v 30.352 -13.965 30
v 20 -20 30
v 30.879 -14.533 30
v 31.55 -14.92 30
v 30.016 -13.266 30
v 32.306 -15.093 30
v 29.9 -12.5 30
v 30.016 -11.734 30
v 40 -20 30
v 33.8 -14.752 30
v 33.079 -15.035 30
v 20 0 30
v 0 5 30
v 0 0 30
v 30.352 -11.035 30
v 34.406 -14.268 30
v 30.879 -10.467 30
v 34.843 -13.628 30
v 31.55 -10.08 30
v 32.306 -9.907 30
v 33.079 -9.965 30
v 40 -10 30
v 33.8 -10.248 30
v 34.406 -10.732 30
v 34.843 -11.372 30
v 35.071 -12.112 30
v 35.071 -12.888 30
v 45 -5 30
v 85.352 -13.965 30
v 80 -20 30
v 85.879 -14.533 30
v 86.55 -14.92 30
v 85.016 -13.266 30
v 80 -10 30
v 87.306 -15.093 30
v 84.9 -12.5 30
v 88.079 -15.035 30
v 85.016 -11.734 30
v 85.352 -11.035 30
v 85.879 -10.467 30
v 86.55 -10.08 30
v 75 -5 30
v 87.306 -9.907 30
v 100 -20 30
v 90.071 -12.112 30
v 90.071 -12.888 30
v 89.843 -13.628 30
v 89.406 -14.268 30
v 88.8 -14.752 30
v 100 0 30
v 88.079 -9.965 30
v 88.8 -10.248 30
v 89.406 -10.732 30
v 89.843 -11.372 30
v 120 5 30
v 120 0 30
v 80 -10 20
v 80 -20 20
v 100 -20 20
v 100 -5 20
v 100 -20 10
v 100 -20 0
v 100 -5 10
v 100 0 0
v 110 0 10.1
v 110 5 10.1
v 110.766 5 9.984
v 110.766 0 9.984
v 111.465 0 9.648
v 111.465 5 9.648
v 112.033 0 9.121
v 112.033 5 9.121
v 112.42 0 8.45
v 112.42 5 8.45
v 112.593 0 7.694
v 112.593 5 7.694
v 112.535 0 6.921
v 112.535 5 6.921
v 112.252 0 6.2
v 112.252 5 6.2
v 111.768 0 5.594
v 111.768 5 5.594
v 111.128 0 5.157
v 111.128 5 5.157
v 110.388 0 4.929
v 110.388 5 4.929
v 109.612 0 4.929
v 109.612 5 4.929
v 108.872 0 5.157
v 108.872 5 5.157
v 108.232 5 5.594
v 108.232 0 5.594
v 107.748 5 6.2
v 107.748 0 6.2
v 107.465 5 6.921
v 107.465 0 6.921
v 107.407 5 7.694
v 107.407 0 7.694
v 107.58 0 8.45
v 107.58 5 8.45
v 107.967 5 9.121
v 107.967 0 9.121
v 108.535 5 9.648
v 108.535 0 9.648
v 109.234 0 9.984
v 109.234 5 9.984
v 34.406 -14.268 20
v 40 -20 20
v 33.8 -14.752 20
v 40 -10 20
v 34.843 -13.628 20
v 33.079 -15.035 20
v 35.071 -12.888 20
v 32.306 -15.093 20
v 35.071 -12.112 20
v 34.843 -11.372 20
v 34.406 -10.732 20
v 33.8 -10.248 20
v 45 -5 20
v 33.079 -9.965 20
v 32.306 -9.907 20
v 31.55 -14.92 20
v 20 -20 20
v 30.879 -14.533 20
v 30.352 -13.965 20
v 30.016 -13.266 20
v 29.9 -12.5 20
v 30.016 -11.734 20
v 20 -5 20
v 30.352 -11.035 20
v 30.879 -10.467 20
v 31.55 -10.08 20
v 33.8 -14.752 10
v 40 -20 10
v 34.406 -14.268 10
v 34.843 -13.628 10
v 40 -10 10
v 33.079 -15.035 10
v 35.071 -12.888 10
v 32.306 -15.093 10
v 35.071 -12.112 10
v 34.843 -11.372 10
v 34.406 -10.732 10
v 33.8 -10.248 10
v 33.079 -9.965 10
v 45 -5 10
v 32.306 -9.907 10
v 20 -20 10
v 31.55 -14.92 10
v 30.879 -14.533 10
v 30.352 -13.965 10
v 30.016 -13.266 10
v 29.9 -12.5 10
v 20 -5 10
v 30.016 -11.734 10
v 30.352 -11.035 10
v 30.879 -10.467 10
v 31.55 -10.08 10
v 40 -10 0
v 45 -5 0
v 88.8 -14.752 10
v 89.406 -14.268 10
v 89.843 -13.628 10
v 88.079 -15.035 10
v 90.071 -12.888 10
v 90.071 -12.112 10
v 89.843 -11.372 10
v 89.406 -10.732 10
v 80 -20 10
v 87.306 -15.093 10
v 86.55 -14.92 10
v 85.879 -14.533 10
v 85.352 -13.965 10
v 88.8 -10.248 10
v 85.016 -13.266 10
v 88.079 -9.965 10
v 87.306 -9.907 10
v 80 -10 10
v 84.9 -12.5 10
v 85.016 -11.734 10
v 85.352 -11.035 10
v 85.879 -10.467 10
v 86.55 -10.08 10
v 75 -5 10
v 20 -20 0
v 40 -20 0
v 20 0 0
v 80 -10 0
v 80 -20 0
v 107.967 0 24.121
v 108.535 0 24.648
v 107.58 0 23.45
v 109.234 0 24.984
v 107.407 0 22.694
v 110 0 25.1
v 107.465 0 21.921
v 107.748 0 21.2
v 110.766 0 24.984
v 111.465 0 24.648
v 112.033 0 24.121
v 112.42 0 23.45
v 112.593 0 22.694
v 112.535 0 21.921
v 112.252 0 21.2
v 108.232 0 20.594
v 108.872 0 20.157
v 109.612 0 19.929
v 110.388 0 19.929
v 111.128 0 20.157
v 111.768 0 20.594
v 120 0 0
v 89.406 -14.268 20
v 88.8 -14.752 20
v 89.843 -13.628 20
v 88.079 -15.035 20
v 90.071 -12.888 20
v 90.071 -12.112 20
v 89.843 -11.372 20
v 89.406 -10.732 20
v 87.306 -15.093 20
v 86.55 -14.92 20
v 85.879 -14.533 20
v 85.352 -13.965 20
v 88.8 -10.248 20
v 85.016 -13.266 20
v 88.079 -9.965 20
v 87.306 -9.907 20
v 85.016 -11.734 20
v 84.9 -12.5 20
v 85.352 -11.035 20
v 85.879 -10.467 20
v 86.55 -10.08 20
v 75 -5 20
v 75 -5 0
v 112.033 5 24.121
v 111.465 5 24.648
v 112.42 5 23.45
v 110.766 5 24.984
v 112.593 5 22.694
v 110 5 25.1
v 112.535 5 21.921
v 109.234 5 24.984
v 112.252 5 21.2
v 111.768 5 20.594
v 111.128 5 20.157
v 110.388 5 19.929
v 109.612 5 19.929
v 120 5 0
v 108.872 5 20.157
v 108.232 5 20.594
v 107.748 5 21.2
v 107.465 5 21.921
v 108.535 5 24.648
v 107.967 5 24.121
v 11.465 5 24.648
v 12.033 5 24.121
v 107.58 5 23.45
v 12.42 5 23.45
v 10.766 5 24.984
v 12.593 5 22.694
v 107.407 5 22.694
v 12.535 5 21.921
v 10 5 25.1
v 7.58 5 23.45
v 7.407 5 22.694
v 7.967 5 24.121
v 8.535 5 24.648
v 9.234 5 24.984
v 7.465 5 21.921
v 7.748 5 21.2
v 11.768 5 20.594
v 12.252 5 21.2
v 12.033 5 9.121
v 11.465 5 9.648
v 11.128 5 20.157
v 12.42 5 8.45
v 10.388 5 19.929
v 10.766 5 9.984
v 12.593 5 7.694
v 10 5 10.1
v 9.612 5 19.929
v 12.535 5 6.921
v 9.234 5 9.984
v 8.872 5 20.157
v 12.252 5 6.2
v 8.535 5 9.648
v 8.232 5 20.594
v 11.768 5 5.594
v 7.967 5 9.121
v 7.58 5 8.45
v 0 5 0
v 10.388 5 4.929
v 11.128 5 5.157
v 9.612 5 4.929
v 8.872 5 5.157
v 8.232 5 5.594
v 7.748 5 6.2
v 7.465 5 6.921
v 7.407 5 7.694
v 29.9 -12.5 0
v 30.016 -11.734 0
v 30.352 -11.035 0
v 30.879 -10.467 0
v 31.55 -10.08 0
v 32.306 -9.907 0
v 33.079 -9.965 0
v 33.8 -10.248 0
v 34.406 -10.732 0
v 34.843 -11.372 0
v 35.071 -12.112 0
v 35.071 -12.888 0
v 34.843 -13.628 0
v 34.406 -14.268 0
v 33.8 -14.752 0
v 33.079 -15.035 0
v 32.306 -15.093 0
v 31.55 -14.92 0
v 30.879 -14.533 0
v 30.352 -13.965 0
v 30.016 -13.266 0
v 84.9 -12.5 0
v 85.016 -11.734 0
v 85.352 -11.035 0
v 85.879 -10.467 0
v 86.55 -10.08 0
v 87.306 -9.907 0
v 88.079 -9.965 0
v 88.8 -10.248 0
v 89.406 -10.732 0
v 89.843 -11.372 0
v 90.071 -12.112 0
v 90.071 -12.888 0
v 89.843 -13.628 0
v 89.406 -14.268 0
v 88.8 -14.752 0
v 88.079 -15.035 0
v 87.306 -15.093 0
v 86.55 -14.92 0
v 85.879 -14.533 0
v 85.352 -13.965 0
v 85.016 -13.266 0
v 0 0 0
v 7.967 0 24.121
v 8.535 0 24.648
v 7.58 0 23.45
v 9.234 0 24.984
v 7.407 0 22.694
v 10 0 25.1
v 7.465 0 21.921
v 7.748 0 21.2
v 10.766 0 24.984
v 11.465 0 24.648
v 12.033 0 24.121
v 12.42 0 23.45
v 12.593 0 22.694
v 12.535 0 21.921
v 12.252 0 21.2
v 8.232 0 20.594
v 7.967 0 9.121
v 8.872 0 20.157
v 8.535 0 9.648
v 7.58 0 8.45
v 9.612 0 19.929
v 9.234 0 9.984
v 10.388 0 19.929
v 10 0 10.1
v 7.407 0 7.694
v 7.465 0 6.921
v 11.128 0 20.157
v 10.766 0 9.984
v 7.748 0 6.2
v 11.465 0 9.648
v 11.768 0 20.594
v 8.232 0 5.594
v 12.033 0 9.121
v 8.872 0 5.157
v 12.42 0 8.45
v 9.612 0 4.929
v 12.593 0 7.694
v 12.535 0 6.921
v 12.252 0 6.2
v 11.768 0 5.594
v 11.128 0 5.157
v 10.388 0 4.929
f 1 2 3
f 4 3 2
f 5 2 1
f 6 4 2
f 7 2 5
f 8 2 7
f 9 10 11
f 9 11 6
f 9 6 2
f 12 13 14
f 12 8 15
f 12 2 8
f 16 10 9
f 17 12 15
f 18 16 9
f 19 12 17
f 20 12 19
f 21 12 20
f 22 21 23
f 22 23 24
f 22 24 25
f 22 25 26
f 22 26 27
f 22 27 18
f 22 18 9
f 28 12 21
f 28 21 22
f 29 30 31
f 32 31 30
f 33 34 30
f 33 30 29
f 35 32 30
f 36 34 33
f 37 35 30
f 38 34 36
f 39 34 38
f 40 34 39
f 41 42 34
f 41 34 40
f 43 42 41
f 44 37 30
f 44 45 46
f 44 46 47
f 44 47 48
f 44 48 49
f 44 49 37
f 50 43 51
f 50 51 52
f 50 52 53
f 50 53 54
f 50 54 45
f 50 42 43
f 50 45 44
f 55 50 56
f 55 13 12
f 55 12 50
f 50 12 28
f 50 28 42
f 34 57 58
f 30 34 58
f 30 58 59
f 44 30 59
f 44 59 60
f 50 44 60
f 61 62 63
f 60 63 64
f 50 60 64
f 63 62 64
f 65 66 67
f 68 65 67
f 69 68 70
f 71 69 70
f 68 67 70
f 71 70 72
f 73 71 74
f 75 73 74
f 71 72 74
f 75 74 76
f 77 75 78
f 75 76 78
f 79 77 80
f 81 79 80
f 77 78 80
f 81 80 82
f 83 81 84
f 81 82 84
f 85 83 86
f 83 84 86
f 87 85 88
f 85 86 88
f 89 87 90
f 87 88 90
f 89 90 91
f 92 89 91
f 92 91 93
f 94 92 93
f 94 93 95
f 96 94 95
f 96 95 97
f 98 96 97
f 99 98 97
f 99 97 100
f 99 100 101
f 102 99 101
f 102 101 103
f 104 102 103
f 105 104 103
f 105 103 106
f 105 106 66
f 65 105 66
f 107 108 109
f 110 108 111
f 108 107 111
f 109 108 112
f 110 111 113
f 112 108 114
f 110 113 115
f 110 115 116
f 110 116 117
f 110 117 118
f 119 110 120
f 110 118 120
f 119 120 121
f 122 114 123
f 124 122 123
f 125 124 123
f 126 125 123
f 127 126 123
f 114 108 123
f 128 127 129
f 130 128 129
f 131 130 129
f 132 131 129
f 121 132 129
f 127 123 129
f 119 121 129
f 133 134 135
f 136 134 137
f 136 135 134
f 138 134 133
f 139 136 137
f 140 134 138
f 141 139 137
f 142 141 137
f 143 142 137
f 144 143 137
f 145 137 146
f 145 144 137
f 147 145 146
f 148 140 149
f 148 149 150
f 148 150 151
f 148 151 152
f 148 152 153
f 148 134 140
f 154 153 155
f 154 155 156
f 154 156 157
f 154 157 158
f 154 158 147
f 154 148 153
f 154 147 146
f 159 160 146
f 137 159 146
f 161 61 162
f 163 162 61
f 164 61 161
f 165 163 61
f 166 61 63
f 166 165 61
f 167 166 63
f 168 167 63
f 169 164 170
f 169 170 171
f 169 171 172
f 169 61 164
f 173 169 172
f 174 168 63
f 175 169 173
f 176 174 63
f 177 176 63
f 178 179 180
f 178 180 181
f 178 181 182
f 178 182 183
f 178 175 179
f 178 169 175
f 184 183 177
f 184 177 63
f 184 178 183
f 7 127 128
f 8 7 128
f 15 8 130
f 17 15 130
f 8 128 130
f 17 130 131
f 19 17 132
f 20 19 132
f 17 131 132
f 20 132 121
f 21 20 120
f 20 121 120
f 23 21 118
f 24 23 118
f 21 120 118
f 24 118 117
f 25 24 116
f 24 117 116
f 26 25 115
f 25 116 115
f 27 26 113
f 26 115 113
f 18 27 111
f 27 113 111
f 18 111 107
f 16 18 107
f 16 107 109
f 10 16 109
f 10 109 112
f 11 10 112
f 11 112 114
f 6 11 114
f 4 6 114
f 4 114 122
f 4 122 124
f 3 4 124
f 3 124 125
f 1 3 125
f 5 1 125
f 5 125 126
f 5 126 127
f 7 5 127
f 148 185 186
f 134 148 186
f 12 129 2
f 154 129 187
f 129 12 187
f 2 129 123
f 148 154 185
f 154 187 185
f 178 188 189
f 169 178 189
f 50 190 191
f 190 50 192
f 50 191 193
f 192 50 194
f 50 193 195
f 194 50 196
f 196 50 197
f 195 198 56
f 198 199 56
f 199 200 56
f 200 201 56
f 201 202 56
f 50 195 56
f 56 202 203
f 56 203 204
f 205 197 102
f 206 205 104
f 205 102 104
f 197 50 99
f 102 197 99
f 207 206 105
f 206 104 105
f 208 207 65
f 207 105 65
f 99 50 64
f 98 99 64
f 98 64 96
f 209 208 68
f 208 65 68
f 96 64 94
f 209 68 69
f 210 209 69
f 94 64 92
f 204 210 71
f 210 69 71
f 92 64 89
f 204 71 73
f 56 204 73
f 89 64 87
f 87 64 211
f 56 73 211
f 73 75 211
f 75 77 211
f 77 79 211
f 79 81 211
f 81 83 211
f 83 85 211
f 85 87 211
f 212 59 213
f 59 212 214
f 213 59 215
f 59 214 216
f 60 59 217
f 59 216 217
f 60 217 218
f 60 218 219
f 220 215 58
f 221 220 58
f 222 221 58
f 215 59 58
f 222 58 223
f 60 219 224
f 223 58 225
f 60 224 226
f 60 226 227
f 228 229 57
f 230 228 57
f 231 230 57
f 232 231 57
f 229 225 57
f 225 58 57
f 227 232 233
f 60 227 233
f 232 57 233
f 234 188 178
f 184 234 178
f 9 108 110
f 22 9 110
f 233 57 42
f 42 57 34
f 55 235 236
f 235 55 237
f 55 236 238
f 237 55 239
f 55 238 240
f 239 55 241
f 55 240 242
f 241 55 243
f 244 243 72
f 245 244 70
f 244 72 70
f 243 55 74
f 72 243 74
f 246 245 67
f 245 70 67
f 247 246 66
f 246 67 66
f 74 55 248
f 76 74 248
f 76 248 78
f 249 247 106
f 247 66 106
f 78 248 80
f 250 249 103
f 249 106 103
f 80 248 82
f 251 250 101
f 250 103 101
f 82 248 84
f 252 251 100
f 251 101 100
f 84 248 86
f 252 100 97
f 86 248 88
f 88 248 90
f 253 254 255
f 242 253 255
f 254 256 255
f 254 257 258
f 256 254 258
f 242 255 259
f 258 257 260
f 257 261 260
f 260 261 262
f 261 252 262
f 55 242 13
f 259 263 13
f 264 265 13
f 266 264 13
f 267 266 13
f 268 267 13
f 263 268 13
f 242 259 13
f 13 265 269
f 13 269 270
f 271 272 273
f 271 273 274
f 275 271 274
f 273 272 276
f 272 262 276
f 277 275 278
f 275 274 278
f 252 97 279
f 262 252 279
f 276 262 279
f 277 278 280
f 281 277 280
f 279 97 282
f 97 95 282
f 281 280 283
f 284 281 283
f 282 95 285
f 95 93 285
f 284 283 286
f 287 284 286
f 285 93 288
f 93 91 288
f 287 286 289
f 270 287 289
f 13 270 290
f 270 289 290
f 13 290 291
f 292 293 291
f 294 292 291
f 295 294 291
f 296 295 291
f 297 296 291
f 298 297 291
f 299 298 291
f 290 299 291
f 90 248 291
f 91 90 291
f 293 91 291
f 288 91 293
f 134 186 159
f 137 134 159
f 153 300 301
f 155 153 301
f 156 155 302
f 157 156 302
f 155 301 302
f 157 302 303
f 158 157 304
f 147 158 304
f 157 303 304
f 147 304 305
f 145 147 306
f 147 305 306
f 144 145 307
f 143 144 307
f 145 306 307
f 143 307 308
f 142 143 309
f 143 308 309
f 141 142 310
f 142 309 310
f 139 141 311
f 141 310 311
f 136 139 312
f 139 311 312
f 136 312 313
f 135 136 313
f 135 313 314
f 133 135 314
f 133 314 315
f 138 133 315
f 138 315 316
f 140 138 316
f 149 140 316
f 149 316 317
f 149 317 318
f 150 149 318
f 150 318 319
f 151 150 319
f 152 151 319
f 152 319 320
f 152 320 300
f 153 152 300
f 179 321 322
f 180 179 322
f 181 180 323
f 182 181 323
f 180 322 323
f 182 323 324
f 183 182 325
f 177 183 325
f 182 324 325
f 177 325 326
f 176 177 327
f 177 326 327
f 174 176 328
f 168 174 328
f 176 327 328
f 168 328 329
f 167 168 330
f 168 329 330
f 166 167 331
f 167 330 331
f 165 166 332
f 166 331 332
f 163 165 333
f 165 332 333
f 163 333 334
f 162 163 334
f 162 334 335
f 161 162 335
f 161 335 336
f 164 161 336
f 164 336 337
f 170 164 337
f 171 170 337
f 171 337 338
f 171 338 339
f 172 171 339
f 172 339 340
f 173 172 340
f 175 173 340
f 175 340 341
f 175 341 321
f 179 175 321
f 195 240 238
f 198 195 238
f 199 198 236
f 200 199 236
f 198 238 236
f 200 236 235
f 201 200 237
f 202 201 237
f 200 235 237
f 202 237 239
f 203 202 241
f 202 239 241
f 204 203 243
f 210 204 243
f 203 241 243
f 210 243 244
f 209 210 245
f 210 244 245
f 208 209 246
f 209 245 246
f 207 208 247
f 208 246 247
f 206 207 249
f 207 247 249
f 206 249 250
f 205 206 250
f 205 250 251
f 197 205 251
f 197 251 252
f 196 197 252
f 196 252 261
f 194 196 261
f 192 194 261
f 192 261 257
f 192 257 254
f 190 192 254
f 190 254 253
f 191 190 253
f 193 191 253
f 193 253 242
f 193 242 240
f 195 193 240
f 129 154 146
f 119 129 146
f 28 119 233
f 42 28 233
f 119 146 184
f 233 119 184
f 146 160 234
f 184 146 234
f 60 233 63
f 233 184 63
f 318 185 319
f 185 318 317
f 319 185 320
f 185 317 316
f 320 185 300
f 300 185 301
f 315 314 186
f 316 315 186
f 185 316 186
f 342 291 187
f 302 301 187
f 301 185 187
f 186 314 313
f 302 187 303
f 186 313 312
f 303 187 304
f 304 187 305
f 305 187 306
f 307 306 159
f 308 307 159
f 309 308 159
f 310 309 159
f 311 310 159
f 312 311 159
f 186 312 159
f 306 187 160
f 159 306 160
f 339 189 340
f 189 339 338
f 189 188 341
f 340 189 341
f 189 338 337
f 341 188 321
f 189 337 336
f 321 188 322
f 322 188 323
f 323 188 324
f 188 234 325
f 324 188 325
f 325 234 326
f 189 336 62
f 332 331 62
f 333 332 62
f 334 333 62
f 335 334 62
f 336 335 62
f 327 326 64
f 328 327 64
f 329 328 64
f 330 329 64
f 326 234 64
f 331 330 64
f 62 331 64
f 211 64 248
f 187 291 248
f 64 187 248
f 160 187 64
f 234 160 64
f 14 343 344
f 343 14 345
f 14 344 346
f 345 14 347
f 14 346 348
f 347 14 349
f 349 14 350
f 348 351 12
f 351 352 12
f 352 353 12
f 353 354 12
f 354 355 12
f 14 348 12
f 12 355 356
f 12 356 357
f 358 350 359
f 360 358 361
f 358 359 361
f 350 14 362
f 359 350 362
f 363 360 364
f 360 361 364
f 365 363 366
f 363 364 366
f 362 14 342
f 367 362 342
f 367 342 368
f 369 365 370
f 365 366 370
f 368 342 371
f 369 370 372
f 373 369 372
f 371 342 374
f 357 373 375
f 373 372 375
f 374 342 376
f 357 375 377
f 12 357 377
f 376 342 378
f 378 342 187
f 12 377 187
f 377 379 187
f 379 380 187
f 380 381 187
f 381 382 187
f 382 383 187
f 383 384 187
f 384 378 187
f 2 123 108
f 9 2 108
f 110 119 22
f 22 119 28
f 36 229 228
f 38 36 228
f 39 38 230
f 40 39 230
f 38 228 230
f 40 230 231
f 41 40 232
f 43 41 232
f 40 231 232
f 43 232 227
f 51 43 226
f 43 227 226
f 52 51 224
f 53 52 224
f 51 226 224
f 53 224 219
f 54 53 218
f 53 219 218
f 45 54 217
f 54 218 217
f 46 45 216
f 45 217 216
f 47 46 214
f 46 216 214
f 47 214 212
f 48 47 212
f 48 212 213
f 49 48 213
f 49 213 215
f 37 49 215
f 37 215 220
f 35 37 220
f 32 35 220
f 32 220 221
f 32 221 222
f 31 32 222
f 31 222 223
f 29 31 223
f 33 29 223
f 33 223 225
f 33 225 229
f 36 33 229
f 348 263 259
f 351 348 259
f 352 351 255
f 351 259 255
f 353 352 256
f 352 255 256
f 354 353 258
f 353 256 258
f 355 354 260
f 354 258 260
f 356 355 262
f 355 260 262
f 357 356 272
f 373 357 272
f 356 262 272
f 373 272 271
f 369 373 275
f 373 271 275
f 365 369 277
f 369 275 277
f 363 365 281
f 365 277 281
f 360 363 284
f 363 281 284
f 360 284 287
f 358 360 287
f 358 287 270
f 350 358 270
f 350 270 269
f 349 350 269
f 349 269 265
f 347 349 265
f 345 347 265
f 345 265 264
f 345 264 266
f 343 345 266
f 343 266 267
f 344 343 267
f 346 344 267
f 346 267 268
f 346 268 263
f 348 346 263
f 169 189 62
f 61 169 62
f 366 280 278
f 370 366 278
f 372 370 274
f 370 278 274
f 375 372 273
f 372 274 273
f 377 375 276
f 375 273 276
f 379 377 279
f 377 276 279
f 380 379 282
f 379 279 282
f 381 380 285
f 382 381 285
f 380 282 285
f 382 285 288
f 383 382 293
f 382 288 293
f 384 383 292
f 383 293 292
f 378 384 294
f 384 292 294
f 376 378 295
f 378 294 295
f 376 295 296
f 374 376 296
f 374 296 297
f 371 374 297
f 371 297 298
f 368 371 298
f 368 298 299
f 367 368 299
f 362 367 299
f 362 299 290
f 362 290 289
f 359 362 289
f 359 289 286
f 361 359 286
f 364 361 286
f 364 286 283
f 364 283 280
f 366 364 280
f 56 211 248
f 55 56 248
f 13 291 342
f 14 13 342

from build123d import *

# Parameters (mm, degrees)
EXTRUDE_1_DEPTH     = 30
CHAMFER_2_SIZE      = 5
SKETCH_2_R          = 2.6
CUT_EXTRUDE_1_DEPTH = 127.194294641
SKETCH_3_W          = 10
SKETCH_3_H          = 15
CUT_EXTRUDE_2_DEPTH = 107.301458127
SKETCH_4_R          = 2.6
CUT_EXTRUDE_3_DEPTH = 126.299640861


with BuildPart() as part:
    # 草图1 → 凸台-拉伸1 (new body)
    with BuildSketch(Plane.XY):
        Polygon((20, 0), (20, -20), (40, -20), (40, -5), (80, -5), (80, -20), (100, -20), (100, 0), (120, 0), (120, 5), (0, 5), (0, 0), align=None)
    extrude(amount=EXTRUDE_1_DEPTH)

    # 倒角2
    chamfer_2_edges = [part.edges().sort_by_distance(p)[0] for p in [
        (80, -5, 15),
        (40, -5, 15),
    ]]
    chamfer(chamfer_2_edges, length=CHAMFER_2_SIZE)

    # 草图2 → 切除-拉伸1 (cut, through all)
    with BuildSketch(Plane(origin=(0, 5, 0), x_dir=(1, 0, 0), z_dir=(0, 1, 0))):
        with Locations(Location((10, -7.5, 0), (0, 0, 270))):
            Circle(SKETCH_2_R)
        with Locations(Location((10, -22.5, 0), (0, 0, 270))):
            Circle(SKETCH_2_R)
        with Locations(Location((110, -22.5, 0), (0, 0, 270))):
            Circle(SKETCH_2_R)
        with Locations(Location((110, -7.5, 0), (0, 0, 270))):
            Circle(SKETCH_2_R)
    extrude(amount=-CUT_EXTRUDE_1_DEPTH, mode=Mode.SUBTRACT)

    # 草图3 → 切除-拉伸2 (cut, through all)
    with BuildSketch(Plane.ZY.offset(-20)):
        with Locations((15, -12.5)):
            Rectangle(SKETCH_3_W, SKETCH_3_H)
    extrude(amount=-CUT_EXTRUDE_2_DEPTH, mode=Mode.SUBTRACT)

    # 草图4 → 切除-拉伸3 (cut, through all)
    with BuildSketch(Plane(origin=(0, 0, 0), x_dir=(-1, 0, 0), z_dir=(0, 0, -1))):
        with Locations((-87.5, -12.5)):
            Circle(SKETCH_4_R)
        with Locations((-32.5, -12.5)):
            Circle(SKETCH_4_R)
    extrude(amount=-CUT_EXTRUDE_3_DEPTH, mode=Mode.SUBTRACT)


solid = part.part
